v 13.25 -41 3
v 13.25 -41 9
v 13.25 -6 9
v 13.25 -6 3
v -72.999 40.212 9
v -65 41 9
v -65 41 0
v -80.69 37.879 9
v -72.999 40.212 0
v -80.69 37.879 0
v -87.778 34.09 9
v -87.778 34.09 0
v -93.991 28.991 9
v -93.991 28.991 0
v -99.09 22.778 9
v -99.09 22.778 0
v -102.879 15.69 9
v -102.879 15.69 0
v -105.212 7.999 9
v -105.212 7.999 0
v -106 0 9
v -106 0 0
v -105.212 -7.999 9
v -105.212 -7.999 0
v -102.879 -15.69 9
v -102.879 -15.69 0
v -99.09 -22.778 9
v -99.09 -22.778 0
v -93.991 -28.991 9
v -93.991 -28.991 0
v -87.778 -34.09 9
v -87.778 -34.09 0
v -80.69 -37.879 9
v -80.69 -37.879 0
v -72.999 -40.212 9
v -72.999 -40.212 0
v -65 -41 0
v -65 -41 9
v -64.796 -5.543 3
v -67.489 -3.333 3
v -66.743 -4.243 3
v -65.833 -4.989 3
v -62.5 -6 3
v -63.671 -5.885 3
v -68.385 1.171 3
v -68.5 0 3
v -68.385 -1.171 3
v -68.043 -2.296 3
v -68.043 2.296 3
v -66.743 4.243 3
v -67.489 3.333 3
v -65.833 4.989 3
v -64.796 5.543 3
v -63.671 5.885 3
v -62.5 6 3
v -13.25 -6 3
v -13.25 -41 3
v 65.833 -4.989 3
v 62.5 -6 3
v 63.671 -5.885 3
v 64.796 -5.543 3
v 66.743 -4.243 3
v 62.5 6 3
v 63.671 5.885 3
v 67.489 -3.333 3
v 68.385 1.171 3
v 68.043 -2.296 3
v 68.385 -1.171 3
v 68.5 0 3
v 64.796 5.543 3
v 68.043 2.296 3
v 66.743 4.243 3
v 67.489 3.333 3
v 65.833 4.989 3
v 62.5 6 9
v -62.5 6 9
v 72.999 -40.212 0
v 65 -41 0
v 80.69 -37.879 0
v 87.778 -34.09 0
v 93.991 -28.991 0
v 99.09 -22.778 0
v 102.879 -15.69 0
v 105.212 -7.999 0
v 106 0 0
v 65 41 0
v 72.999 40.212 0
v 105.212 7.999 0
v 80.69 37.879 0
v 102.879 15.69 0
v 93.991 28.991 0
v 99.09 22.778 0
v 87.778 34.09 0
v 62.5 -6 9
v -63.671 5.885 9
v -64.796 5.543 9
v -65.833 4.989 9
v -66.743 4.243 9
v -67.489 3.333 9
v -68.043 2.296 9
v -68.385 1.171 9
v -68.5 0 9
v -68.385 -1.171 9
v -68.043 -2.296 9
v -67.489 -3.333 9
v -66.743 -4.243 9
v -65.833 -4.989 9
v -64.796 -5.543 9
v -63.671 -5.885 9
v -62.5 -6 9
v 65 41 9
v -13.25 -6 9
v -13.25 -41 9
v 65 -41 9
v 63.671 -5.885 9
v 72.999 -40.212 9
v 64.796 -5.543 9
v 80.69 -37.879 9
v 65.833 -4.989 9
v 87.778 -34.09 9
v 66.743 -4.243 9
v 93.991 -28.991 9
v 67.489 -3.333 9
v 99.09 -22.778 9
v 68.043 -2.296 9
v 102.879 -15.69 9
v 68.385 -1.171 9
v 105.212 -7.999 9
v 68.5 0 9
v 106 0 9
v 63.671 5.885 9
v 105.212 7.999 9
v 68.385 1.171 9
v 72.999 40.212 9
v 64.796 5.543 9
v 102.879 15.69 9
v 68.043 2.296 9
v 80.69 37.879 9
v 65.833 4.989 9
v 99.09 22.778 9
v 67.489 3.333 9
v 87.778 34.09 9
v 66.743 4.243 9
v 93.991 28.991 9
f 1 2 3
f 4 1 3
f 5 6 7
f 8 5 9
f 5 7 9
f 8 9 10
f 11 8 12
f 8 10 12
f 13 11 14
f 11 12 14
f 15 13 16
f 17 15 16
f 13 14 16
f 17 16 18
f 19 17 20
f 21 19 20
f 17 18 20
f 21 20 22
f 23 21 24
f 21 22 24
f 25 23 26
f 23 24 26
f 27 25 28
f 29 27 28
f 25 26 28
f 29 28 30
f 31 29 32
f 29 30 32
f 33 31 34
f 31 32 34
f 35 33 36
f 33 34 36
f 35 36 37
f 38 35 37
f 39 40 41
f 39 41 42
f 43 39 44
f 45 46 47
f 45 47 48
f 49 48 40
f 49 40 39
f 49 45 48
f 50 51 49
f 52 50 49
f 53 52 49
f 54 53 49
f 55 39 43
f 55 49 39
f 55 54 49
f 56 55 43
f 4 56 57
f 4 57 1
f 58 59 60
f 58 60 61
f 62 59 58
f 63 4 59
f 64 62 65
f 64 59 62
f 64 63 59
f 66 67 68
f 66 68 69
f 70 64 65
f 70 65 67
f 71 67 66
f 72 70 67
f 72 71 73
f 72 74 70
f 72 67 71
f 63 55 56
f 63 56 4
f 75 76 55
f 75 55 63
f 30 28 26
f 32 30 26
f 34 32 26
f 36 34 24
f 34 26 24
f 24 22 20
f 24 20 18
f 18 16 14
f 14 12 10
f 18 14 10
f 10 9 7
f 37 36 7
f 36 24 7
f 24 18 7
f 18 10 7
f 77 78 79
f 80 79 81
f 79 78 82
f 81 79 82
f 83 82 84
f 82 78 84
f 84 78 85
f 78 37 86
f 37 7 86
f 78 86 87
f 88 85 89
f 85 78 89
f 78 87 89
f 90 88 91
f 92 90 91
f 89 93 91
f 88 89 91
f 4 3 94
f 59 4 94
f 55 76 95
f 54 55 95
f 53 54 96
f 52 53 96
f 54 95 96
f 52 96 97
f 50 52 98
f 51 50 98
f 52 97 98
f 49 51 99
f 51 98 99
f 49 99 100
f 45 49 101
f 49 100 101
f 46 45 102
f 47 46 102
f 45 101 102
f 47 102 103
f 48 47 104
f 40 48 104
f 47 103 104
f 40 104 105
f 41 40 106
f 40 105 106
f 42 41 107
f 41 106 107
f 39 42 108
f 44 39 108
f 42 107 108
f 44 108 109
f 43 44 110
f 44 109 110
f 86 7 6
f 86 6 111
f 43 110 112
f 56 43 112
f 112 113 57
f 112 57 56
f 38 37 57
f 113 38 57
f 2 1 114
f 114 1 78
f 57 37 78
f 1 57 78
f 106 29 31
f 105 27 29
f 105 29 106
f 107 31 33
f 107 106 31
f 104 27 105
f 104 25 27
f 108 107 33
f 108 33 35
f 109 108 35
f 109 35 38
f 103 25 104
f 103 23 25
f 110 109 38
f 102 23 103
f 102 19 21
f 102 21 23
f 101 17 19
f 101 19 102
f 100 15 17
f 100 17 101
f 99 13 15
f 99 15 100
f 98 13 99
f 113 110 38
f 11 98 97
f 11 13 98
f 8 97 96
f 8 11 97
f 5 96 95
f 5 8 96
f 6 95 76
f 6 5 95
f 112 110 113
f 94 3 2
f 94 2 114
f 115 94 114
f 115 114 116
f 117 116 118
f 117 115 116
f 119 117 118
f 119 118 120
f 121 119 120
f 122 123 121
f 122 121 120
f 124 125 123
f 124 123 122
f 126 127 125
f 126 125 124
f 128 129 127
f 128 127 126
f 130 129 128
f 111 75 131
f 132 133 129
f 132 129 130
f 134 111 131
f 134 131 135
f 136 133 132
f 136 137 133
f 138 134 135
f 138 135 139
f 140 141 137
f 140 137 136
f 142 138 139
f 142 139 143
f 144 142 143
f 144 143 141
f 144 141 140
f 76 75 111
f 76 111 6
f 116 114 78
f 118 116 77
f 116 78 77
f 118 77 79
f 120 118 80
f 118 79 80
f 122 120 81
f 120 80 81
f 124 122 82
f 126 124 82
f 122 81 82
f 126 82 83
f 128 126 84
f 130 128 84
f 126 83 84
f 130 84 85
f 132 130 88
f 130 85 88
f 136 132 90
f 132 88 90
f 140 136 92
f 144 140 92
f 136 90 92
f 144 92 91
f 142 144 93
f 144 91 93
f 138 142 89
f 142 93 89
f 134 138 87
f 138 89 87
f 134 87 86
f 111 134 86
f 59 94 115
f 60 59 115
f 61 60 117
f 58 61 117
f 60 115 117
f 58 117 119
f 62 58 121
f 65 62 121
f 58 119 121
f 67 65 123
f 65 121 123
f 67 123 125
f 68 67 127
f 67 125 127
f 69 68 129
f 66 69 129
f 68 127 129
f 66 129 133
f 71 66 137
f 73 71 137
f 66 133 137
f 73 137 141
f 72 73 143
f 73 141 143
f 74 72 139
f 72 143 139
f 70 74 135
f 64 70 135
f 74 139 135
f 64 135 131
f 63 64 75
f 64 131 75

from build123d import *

# Parameters (mm, degrees)
PAD_DEPTH       = 9
POCKET_DEPTH    = 6
SKETCH002_W     = 26.5
SKETCH002_H     = 35
POCKET001_DEPTH = 6


with BuildPart() as part:
    # Sketch → Pad (new body)
    with BuildSketch(Plane.XY):
        with BuildLine():
            ThreePointArc((-65, 41), (-106, 0), (-65, -41))
            Line((-65, -41), (65, -41))
            ThreePointArc((65, -41), (106, 0), (65, 41))
            Line((-65, 41), (65, 41))
        make_face()
    extrude(amount=PAD_DEPTH)

    # Sketch001 (on Face6 of Pad) → Pocket (cut)
    with BuildSketch(Plane.XY.offset(9)):
        with BuildLine():
            ThreePointArc((-62.5, 6), (-68.5, 0), (-62.5, -6))
            Line((-62.5, -6), (62.5, -6))
            ThreePointArc((62.5, -6), (68.5, 0), (62.5, 6))
            Line((-62.5, 6), (62.5, 6))
        make_face()
    extrude(amount=-POCKET_DEPTH, mode=Mode.SUBTRACT)

    # Sketch002 (on Face5 of Pocket) → Pocket001 (cut)
    with BuildSketch(Plane.XY.offset(9)):
        with Locations((0, -23.5)):
            Rectangle(SKETCH002_W, SKETCH002_H)
    extrude(amount=-POCKET001_DEPTH, mode=Mode.SUBTRACT)


solid = part.part
